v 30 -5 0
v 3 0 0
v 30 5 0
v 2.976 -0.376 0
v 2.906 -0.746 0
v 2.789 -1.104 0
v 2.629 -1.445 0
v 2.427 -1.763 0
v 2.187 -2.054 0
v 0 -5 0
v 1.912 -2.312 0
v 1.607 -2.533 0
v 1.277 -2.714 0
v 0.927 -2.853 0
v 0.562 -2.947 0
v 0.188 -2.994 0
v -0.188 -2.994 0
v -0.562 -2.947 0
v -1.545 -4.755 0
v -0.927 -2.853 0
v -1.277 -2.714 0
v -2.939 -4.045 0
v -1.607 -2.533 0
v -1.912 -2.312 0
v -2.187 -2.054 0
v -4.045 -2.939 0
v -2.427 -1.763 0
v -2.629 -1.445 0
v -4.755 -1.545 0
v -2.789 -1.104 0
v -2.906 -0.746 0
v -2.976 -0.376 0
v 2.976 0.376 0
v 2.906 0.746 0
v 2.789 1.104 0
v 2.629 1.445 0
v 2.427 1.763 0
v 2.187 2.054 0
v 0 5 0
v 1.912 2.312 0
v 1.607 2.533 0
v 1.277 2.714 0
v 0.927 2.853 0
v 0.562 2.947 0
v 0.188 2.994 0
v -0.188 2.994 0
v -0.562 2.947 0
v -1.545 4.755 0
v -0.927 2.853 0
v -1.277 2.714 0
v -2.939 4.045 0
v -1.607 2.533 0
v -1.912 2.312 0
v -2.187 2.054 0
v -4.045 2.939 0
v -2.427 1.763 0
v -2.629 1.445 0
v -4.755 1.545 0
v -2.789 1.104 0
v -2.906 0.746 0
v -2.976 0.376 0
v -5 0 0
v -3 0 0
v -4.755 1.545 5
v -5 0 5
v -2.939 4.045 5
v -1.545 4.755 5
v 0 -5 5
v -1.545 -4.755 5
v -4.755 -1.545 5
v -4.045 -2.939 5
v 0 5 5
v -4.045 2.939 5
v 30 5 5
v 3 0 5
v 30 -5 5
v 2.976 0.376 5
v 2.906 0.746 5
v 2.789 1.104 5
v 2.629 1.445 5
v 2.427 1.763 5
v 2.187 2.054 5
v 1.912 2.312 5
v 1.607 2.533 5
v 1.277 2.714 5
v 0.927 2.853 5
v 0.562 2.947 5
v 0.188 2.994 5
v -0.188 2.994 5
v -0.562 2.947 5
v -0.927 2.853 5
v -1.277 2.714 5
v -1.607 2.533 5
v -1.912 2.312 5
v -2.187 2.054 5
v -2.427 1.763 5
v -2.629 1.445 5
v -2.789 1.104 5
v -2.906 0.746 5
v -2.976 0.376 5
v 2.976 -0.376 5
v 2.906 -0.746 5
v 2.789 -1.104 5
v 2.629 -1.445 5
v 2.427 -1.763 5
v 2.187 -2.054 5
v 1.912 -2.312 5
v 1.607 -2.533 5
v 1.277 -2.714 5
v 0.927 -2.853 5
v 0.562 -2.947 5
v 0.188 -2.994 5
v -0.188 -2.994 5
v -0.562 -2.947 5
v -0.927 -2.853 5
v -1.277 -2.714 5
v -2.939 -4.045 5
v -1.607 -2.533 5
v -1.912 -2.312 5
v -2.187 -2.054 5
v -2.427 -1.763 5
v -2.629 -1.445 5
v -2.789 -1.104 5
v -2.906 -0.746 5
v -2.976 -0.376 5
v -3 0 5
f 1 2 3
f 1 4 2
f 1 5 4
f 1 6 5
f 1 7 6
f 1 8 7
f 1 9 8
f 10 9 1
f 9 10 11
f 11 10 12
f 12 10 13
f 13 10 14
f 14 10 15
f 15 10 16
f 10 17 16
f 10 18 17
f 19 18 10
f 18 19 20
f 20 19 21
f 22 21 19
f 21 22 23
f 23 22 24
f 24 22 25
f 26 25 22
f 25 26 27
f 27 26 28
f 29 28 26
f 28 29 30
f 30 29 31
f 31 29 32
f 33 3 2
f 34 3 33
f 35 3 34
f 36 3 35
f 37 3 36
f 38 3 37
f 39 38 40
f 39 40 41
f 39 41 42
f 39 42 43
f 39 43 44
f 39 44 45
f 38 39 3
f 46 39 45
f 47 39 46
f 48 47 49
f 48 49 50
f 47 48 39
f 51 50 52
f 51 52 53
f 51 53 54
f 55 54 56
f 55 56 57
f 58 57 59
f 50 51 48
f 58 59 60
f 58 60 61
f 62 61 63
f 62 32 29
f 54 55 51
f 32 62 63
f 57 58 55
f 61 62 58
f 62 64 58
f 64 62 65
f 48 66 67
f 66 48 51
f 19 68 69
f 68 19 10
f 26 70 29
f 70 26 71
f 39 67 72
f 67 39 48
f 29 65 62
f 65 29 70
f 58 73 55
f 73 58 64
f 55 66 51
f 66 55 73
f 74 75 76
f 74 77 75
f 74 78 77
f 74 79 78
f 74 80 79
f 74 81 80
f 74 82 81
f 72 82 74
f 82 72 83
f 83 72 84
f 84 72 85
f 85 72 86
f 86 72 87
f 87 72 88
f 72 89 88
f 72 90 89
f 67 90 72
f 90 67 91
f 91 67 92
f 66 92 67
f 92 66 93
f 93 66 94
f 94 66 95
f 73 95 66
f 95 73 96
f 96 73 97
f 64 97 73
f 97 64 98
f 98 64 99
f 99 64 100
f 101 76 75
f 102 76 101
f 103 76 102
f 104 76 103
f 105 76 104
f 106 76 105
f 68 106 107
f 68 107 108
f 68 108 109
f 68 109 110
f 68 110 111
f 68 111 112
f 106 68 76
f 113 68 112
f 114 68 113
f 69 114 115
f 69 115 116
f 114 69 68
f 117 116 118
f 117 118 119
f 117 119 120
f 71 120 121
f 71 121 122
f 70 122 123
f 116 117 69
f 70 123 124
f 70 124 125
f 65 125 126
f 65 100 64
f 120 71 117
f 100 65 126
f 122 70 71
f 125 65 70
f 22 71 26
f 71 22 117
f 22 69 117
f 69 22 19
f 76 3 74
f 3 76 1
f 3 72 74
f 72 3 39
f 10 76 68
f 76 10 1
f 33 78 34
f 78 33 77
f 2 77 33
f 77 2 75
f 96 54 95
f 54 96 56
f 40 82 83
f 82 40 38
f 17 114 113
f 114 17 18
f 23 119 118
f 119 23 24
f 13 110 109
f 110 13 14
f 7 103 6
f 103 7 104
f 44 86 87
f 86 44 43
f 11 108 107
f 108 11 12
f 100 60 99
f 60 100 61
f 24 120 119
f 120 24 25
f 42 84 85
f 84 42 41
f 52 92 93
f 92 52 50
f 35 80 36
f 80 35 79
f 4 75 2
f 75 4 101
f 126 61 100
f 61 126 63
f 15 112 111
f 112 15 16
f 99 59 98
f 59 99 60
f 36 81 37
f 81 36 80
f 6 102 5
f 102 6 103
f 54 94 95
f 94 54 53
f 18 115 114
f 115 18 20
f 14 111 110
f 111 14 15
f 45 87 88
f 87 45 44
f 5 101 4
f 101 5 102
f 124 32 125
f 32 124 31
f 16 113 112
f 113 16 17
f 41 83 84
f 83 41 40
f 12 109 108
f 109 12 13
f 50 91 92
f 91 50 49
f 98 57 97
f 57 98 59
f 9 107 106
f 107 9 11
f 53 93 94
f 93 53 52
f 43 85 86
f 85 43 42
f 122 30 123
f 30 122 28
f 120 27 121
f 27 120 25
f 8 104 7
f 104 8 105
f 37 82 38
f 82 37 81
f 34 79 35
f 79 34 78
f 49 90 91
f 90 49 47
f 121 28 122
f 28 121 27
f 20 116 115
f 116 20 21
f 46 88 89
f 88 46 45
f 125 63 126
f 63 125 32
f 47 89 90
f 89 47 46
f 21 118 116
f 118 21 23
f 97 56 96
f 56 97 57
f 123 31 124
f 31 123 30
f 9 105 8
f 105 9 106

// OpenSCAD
$fn = 20;

difference() {
    union() {
        cylinder(r = 5, h = 5);
        translate([0, -5, 0]) cube([30, 10, 5]);
    }
    color("red") cylinder(r = 3, h = 6, $fn = 50);
}
